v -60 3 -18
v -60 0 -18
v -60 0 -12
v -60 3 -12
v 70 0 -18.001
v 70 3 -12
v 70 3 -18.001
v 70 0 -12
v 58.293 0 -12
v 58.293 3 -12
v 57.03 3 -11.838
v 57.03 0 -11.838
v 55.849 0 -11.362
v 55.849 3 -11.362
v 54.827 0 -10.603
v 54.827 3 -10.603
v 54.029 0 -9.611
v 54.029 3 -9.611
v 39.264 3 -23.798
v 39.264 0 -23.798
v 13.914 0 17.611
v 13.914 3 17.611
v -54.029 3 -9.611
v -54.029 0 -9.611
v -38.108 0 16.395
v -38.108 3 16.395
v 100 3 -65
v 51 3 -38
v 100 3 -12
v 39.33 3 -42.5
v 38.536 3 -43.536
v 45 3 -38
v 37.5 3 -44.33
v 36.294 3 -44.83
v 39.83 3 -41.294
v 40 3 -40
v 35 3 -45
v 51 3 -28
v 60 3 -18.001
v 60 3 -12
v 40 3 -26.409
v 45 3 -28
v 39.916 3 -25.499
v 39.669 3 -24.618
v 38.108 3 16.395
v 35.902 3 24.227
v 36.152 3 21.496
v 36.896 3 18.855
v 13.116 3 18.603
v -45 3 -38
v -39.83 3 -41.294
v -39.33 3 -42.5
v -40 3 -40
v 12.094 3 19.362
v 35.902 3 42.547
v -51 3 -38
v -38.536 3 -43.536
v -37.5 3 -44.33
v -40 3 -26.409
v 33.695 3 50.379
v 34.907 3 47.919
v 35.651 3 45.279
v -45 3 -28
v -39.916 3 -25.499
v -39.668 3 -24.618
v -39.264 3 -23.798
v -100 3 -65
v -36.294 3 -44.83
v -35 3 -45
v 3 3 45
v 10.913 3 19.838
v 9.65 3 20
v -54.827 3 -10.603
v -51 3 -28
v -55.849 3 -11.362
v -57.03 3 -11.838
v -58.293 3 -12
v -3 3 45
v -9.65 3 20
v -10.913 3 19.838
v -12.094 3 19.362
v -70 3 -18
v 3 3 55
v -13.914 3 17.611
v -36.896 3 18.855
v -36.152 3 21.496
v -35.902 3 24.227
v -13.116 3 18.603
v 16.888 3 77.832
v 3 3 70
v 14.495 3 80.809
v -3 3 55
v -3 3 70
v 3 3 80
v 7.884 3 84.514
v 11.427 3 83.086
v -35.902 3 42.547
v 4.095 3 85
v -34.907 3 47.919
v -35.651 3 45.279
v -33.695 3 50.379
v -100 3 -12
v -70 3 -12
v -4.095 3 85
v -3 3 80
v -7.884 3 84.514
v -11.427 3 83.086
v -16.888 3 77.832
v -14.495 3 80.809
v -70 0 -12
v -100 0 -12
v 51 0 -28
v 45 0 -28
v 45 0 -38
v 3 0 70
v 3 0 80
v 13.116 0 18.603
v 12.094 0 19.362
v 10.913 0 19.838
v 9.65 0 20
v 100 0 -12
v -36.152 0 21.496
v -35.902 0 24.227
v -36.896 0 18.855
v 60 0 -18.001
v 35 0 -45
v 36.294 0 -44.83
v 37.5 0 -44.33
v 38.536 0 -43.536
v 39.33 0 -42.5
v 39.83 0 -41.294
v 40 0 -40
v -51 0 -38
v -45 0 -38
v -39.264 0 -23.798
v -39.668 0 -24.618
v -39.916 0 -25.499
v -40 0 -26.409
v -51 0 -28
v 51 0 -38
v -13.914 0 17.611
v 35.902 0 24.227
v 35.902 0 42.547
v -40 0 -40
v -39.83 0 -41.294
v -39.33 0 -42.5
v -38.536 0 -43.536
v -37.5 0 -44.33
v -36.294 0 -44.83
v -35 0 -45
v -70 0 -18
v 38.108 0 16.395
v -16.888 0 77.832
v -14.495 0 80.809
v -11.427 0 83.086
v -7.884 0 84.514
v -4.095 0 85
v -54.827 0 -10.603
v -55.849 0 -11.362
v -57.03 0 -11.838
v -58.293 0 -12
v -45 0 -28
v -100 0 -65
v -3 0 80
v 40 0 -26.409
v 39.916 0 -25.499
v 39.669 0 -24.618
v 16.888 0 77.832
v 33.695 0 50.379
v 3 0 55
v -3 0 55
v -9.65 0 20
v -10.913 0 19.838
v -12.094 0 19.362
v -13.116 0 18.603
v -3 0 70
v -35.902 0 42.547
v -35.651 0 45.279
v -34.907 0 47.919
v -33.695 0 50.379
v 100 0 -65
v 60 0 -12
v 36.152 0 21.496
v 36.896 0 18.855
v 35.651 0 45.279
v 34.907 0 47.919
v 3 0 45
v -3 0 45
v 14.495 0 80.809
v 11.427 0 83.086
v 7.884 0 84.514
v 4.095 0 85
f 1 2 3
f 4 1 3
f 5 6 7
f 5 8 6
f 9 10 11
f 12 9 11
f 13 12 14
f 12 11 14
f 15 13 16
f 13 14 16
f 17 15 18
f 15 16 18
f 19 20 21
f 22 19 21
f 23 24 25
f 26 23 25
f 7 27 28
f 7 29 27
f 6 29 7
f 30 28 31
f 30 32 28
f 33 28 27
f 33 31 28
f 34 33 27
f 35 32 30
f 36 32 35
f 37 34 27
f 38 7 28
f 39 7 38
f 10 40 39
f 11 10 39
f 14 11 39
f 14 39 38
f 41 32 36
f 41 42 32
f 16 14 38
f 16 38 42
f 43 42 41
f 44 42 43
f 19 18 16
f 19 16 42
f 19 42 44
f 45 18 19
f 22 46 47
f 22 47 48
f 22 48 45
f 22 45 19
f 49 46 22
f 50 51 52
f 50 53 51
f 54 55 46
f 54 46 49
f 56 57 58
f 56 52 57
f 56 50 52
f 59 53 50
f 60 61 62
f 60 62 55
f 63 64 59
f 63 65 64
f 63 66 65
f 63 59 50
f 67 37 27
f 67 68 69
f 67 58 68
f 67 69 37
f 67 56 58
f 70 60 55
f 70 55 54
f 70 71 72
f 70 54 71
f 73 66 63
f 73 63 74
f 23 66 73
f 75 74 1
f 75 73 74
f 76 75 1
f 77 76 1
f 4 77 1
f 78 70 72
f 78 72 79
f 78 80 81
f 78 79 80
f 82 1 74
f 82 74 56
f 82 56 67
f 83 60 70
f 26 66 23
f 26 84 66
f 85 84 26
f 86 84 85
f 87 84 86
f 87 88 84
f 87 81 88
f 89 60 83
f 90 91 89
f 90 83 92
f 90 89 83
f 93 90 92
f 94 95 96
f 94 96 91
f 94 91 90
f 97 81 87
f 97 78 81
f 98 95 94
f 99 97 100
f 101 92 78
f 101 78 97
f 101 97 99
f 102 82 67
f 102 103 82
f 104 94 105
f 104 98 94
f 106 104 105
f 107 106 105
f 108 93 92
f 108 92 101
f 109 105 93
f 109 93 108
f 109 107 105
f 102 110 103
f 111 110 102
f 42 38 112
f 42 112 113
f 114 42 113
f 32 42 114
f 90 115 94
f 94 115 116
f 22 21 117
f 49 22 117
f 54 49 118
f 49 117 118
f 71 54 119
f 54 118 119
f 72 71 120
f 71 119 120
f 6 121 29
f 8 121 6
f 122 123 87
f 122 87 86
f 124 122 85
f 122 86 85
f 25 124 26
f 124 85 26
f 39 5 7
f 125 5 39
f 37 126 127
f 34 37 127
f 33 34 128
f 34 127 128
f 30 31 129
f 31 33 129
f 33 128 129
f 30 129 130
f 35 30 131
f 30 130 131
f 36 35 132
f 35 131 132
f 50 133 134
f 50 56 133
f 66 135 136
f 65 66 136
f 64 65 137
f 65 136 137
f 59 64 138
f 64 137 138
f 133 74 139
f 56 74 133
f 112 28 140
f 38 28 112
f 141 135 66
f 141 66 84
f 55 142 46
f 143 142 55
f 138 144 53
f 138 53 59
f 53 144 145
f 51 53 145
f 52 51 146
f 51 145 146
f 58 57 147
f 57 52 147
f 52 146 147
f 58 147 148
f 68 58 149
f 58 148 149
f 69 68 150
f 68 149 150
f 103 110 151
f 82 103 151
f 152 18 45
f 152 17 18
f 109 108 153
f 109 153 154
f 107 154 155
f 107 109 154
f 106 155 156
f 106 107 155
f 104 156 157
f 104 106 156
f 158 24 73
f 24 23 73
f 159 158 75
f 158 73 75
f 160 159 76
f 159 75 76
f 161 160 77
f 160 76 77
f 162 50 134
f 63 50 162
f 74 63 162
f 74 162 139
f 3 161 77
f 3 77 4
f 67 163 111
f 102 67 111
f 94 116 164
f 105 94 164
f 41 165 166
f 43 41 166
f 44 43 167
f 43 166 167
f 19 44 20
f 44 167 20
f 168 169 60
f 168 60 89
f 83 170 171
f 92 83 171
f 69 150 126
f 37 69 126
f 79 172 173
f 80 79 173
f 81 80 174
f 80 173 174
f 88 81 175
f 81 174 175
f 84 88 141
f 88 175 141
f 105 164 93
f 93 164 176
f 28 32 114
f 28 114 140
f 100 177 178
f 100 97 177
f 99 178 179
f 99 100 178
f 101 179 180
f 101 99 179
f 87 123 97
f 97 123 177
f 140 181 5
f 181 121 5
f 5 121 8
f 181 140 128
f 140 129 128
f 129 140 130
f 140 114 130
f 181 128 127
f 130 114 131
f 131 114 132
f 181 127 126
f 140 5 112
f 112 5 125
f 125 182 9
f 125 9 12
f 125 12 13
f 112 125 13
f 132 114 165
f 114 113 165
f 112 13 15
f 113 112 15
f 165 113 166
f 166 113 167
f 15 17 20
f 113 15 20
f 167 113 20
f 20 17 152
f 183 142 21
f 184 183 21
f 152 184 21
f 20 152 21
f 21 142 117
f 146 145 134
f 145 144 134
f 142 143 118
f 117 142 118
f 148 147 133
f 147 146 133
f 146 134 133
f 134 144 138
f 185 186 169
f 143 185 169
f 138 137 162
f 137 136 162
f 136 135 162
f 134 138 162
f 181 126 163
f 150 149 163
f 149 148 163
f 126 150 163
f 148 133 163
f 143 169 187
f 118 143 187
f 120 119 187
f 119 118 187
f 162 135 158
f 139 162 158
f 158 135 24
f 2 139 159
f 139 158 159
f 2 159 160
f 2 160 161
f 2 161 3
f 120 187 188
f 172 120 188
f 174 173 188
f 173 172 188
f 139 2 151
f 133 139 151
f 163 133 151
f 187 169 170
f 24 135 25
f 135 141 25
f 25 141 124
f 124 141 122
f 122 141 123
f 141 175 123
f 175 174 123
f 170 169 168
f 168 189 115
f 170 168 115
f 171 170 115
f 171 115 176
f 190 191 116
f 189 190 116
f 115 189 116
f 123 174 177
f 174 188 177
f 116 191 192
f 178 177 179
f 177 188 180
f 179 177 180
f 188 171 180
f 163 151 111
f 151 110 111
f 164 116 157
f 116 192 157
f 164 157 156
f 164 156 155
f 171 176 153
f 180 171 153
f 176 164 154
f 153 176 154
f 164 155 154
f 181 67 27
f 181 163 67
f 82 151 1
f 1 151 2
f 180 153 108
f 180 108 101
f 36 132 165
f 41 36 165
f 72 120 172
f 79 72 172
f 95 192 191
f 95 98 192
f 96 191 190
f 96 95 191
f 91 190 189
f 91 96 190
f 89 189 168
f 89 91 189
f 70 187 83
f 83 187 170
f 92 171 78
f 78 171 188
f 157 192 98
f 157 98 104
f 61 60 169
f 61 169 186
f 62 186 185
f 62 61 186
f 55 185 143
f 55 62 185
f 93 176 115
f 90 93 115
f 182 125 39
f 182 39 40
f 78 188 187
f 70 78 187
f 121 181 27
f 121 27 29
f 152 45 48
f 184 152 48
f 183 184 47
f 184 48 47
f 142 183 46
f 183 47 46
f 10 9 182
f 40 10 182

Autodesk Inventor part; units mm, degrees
ref_plane "YZ Plane" through (0, 0, 0) normal (1, 0, 0) x (0, 1, 0)
ref_plane "XZ Plane" through (0, 0, 0) normal (0, 1, 0) x (-1, 0, 0)
ref_plane "XY Plane" through (0, 0, 0) normal (0, 0, 1) x (1, 0, 0)
sketch "Sketch2" plane through (0, 0, 0) normal (0, 1, 0) x (-1, 0, 0)
  line L0 (70, -18) -> (60, -18)
  line L1 (60, -18) -> (60, -12)
  line L2 (70, -12) -> (70, -18)
  line L3 (-70, -18.0006) -> (-60, -18.0006)
  line L4 (-60, -18.0006) -> (-60, -12.0003)
  line L5 (-70, -12.0003) -> (-70, -18.0006)
  line L6 (3, 70) -> (-3, 70)
  line L7 (-3, 70) -> (-3, 80)
  line L8 (-3, 80) -> (3, 80)
  line L9 (3, 80) -> (3, 70)
  line L10 (3, 45) -> (-3, 45)
  line L11 (-3, 45) -> (-3, 55)
  line L12 (-3, 55) -> (3, 55)
  line L13 (3, 55) -> (3, 45)
  line L14 (100, -65) -> (-100, -65)
  line L15 (-12.5, 85) -> (12.5, 85)
  line L16 (12.5, 85) -> (35.9015, 46.7742)
  line L17 (-100, -12.0003) -> (-70, -12.0003)
  line L18 (-55.4919, -12.0003) -> (-60, -12.0003)
  line L19 (55.4917, -12) -> (60, -12)
  line L20 (70, -12) -> (100, -12)
  line L21 (-100, -65) -> (-100, -12.0003)
  line L22 (100, -65) -> (100, -12)
  line L23 (35, -45) -> (-35, -45)
  line L24 (-40, -40) -> (-40, -26.409)
  line L25 (-39.2644, -23.7983) -> (-13.9141, 17.6106)
  line L26 (-9.6497, 20) -> (9.6497, 20)
  line L27 (40, -40) -> (40, -26.409)
  line L28 (39.2644, -23.7983) -> (13.9141, 17.6106)
  arc A0 (-40, -40) -> (-35, -45) centre (-35, -40) ccw
  arc A1 (-39.2644, -23.7983) -> (-40, -26.409) centre (-35, -26.409) ccw
  arc A2 (-9.6497, 20) -> (-13.9141, 17.6106) centre (-9.6497, 15) ccw
  arc A3 (13.9141, 17.6106) -> (9.6497, 20) centre (9.6497, 15) ccw
  arc A4 (40, -26.409) -> (39.2644, -23.7983) centre (35, -26.409) ccw
  arc A5 (35, -45) -> (40, -40) centre (35, -40) ccw
  line L29 (55.4917, -12) -> (35.9015, 20)
  line L30 (35.9015, 20) -> (35.9015, 46.7742)
  line L31 (-55.4919, -12.0003) -> (-35.9015, 20)
  line L32 (-35.9015, 20) -> (-35.9015, 46.7742)
  line L33 (-35.9015, 46.7742) -> (-12.5, 85)
  line L34 (0, -65) -> (0, 85) construction
  point P0 (0, 0)
  point P1 (0, 80)
  point P2 (0, 45)
  point P3 (0, 55)
  point P4 (0, 0)
  point P5 (0, 0)
  point P6 (-70, -15.4178)
  point P7 (75.3708, -12)
  point P8 (0, 0)
  point P9 (-40, -45)
  point P10 (40, -45)
  point P11 (-40, -25)
  point P12 (-12.4513, 20)
  point P13 (12.4513, 20)
  point P14 (40, -25)
  point P15 (0, 20)
  point P16 (0, -45)
  point P17 (0, 85)
  dimension "d65" = 200
  dimension "d115" = 10
  dimension "d116" = 6
  dimension "d118" = 10
  dimension "d119" = 6
  dimension "d120" = 15
  dimension "d147" = 65
  dimension "d173" = 25
  dimension "d187" = 100
  dimension "d191" = 30
  dimension "d192" = 30
  dimension "d194" = 6.0003
  dimension "d195" = 6
  dimension "d196" = 10
  dimension "d197" = 10
  dimension "d198" = 52.9997
  dimension "d199" = 53
  dimension "d204" = 150
  dimension "d213" = 20
  dimension "d214" = 20
  dimension "d218" = 65
  dimension "d219" = 40
  dimension "d220" = 5
  dimension "d233" = 148.525
  dimension "d235" = 5
  dimension "d236" = 20
extrude "Extrusion11" add sketch "Sketch2" along normal blind 3
sketch "Sketch4" plane through (0, 3, 0) normal (0, 1, 0) x (1, 0, 0)
  line L0 (-51, 38) -> (-45, 38)
  line L1 (-45, 38) -> (-45, 28)
  line L2 (-45, 28) -> (-51, 28)
  line L3 (-51, 28) -> (-51, 38)
  line L4 (100, 65) -> (-100, 65) projected
  line L5 (-40, 40) -> (-40, 26.409) projected
  line L6 (45, 38) -> (51, 38)
  line L7 (51, 38) -> (51, 28)
  line L8 (51, 28) -> (45, 28)
  line L9 (45, 28) -> (45, 38)
  line L10 (40, 40) -> (40, 26.409) projected
  point P0 (0, 0)
  dimension "d237" = 6
  dimension "d238" = 27
  dimension "d239" = 10
  dimension "d240" = 5
  dimension "d241" = 6
  dimension "d242" = 10
  dimension "d243" = 5
  dimension "d244" = 27
extrude "Extrusion13" cut sketch "Sketch4" against normal through all
fillet "Fillet1" radius 15 6 edges at (12.5, 1.5, 85) (-12.5, 1.5, 85) (-35.9015, 1.5, 46.7742) (35.9015, 1.5, 46.7742) (35.9015, 1.5, 20) (-35.9015, 1.5, 20)
fillet "Fillet2" radius 5 2 edges at (55.4919, 1.5, -12.0003) (-55.4917, 1.5, -12)
properties part number "Top Plate 27100914"
